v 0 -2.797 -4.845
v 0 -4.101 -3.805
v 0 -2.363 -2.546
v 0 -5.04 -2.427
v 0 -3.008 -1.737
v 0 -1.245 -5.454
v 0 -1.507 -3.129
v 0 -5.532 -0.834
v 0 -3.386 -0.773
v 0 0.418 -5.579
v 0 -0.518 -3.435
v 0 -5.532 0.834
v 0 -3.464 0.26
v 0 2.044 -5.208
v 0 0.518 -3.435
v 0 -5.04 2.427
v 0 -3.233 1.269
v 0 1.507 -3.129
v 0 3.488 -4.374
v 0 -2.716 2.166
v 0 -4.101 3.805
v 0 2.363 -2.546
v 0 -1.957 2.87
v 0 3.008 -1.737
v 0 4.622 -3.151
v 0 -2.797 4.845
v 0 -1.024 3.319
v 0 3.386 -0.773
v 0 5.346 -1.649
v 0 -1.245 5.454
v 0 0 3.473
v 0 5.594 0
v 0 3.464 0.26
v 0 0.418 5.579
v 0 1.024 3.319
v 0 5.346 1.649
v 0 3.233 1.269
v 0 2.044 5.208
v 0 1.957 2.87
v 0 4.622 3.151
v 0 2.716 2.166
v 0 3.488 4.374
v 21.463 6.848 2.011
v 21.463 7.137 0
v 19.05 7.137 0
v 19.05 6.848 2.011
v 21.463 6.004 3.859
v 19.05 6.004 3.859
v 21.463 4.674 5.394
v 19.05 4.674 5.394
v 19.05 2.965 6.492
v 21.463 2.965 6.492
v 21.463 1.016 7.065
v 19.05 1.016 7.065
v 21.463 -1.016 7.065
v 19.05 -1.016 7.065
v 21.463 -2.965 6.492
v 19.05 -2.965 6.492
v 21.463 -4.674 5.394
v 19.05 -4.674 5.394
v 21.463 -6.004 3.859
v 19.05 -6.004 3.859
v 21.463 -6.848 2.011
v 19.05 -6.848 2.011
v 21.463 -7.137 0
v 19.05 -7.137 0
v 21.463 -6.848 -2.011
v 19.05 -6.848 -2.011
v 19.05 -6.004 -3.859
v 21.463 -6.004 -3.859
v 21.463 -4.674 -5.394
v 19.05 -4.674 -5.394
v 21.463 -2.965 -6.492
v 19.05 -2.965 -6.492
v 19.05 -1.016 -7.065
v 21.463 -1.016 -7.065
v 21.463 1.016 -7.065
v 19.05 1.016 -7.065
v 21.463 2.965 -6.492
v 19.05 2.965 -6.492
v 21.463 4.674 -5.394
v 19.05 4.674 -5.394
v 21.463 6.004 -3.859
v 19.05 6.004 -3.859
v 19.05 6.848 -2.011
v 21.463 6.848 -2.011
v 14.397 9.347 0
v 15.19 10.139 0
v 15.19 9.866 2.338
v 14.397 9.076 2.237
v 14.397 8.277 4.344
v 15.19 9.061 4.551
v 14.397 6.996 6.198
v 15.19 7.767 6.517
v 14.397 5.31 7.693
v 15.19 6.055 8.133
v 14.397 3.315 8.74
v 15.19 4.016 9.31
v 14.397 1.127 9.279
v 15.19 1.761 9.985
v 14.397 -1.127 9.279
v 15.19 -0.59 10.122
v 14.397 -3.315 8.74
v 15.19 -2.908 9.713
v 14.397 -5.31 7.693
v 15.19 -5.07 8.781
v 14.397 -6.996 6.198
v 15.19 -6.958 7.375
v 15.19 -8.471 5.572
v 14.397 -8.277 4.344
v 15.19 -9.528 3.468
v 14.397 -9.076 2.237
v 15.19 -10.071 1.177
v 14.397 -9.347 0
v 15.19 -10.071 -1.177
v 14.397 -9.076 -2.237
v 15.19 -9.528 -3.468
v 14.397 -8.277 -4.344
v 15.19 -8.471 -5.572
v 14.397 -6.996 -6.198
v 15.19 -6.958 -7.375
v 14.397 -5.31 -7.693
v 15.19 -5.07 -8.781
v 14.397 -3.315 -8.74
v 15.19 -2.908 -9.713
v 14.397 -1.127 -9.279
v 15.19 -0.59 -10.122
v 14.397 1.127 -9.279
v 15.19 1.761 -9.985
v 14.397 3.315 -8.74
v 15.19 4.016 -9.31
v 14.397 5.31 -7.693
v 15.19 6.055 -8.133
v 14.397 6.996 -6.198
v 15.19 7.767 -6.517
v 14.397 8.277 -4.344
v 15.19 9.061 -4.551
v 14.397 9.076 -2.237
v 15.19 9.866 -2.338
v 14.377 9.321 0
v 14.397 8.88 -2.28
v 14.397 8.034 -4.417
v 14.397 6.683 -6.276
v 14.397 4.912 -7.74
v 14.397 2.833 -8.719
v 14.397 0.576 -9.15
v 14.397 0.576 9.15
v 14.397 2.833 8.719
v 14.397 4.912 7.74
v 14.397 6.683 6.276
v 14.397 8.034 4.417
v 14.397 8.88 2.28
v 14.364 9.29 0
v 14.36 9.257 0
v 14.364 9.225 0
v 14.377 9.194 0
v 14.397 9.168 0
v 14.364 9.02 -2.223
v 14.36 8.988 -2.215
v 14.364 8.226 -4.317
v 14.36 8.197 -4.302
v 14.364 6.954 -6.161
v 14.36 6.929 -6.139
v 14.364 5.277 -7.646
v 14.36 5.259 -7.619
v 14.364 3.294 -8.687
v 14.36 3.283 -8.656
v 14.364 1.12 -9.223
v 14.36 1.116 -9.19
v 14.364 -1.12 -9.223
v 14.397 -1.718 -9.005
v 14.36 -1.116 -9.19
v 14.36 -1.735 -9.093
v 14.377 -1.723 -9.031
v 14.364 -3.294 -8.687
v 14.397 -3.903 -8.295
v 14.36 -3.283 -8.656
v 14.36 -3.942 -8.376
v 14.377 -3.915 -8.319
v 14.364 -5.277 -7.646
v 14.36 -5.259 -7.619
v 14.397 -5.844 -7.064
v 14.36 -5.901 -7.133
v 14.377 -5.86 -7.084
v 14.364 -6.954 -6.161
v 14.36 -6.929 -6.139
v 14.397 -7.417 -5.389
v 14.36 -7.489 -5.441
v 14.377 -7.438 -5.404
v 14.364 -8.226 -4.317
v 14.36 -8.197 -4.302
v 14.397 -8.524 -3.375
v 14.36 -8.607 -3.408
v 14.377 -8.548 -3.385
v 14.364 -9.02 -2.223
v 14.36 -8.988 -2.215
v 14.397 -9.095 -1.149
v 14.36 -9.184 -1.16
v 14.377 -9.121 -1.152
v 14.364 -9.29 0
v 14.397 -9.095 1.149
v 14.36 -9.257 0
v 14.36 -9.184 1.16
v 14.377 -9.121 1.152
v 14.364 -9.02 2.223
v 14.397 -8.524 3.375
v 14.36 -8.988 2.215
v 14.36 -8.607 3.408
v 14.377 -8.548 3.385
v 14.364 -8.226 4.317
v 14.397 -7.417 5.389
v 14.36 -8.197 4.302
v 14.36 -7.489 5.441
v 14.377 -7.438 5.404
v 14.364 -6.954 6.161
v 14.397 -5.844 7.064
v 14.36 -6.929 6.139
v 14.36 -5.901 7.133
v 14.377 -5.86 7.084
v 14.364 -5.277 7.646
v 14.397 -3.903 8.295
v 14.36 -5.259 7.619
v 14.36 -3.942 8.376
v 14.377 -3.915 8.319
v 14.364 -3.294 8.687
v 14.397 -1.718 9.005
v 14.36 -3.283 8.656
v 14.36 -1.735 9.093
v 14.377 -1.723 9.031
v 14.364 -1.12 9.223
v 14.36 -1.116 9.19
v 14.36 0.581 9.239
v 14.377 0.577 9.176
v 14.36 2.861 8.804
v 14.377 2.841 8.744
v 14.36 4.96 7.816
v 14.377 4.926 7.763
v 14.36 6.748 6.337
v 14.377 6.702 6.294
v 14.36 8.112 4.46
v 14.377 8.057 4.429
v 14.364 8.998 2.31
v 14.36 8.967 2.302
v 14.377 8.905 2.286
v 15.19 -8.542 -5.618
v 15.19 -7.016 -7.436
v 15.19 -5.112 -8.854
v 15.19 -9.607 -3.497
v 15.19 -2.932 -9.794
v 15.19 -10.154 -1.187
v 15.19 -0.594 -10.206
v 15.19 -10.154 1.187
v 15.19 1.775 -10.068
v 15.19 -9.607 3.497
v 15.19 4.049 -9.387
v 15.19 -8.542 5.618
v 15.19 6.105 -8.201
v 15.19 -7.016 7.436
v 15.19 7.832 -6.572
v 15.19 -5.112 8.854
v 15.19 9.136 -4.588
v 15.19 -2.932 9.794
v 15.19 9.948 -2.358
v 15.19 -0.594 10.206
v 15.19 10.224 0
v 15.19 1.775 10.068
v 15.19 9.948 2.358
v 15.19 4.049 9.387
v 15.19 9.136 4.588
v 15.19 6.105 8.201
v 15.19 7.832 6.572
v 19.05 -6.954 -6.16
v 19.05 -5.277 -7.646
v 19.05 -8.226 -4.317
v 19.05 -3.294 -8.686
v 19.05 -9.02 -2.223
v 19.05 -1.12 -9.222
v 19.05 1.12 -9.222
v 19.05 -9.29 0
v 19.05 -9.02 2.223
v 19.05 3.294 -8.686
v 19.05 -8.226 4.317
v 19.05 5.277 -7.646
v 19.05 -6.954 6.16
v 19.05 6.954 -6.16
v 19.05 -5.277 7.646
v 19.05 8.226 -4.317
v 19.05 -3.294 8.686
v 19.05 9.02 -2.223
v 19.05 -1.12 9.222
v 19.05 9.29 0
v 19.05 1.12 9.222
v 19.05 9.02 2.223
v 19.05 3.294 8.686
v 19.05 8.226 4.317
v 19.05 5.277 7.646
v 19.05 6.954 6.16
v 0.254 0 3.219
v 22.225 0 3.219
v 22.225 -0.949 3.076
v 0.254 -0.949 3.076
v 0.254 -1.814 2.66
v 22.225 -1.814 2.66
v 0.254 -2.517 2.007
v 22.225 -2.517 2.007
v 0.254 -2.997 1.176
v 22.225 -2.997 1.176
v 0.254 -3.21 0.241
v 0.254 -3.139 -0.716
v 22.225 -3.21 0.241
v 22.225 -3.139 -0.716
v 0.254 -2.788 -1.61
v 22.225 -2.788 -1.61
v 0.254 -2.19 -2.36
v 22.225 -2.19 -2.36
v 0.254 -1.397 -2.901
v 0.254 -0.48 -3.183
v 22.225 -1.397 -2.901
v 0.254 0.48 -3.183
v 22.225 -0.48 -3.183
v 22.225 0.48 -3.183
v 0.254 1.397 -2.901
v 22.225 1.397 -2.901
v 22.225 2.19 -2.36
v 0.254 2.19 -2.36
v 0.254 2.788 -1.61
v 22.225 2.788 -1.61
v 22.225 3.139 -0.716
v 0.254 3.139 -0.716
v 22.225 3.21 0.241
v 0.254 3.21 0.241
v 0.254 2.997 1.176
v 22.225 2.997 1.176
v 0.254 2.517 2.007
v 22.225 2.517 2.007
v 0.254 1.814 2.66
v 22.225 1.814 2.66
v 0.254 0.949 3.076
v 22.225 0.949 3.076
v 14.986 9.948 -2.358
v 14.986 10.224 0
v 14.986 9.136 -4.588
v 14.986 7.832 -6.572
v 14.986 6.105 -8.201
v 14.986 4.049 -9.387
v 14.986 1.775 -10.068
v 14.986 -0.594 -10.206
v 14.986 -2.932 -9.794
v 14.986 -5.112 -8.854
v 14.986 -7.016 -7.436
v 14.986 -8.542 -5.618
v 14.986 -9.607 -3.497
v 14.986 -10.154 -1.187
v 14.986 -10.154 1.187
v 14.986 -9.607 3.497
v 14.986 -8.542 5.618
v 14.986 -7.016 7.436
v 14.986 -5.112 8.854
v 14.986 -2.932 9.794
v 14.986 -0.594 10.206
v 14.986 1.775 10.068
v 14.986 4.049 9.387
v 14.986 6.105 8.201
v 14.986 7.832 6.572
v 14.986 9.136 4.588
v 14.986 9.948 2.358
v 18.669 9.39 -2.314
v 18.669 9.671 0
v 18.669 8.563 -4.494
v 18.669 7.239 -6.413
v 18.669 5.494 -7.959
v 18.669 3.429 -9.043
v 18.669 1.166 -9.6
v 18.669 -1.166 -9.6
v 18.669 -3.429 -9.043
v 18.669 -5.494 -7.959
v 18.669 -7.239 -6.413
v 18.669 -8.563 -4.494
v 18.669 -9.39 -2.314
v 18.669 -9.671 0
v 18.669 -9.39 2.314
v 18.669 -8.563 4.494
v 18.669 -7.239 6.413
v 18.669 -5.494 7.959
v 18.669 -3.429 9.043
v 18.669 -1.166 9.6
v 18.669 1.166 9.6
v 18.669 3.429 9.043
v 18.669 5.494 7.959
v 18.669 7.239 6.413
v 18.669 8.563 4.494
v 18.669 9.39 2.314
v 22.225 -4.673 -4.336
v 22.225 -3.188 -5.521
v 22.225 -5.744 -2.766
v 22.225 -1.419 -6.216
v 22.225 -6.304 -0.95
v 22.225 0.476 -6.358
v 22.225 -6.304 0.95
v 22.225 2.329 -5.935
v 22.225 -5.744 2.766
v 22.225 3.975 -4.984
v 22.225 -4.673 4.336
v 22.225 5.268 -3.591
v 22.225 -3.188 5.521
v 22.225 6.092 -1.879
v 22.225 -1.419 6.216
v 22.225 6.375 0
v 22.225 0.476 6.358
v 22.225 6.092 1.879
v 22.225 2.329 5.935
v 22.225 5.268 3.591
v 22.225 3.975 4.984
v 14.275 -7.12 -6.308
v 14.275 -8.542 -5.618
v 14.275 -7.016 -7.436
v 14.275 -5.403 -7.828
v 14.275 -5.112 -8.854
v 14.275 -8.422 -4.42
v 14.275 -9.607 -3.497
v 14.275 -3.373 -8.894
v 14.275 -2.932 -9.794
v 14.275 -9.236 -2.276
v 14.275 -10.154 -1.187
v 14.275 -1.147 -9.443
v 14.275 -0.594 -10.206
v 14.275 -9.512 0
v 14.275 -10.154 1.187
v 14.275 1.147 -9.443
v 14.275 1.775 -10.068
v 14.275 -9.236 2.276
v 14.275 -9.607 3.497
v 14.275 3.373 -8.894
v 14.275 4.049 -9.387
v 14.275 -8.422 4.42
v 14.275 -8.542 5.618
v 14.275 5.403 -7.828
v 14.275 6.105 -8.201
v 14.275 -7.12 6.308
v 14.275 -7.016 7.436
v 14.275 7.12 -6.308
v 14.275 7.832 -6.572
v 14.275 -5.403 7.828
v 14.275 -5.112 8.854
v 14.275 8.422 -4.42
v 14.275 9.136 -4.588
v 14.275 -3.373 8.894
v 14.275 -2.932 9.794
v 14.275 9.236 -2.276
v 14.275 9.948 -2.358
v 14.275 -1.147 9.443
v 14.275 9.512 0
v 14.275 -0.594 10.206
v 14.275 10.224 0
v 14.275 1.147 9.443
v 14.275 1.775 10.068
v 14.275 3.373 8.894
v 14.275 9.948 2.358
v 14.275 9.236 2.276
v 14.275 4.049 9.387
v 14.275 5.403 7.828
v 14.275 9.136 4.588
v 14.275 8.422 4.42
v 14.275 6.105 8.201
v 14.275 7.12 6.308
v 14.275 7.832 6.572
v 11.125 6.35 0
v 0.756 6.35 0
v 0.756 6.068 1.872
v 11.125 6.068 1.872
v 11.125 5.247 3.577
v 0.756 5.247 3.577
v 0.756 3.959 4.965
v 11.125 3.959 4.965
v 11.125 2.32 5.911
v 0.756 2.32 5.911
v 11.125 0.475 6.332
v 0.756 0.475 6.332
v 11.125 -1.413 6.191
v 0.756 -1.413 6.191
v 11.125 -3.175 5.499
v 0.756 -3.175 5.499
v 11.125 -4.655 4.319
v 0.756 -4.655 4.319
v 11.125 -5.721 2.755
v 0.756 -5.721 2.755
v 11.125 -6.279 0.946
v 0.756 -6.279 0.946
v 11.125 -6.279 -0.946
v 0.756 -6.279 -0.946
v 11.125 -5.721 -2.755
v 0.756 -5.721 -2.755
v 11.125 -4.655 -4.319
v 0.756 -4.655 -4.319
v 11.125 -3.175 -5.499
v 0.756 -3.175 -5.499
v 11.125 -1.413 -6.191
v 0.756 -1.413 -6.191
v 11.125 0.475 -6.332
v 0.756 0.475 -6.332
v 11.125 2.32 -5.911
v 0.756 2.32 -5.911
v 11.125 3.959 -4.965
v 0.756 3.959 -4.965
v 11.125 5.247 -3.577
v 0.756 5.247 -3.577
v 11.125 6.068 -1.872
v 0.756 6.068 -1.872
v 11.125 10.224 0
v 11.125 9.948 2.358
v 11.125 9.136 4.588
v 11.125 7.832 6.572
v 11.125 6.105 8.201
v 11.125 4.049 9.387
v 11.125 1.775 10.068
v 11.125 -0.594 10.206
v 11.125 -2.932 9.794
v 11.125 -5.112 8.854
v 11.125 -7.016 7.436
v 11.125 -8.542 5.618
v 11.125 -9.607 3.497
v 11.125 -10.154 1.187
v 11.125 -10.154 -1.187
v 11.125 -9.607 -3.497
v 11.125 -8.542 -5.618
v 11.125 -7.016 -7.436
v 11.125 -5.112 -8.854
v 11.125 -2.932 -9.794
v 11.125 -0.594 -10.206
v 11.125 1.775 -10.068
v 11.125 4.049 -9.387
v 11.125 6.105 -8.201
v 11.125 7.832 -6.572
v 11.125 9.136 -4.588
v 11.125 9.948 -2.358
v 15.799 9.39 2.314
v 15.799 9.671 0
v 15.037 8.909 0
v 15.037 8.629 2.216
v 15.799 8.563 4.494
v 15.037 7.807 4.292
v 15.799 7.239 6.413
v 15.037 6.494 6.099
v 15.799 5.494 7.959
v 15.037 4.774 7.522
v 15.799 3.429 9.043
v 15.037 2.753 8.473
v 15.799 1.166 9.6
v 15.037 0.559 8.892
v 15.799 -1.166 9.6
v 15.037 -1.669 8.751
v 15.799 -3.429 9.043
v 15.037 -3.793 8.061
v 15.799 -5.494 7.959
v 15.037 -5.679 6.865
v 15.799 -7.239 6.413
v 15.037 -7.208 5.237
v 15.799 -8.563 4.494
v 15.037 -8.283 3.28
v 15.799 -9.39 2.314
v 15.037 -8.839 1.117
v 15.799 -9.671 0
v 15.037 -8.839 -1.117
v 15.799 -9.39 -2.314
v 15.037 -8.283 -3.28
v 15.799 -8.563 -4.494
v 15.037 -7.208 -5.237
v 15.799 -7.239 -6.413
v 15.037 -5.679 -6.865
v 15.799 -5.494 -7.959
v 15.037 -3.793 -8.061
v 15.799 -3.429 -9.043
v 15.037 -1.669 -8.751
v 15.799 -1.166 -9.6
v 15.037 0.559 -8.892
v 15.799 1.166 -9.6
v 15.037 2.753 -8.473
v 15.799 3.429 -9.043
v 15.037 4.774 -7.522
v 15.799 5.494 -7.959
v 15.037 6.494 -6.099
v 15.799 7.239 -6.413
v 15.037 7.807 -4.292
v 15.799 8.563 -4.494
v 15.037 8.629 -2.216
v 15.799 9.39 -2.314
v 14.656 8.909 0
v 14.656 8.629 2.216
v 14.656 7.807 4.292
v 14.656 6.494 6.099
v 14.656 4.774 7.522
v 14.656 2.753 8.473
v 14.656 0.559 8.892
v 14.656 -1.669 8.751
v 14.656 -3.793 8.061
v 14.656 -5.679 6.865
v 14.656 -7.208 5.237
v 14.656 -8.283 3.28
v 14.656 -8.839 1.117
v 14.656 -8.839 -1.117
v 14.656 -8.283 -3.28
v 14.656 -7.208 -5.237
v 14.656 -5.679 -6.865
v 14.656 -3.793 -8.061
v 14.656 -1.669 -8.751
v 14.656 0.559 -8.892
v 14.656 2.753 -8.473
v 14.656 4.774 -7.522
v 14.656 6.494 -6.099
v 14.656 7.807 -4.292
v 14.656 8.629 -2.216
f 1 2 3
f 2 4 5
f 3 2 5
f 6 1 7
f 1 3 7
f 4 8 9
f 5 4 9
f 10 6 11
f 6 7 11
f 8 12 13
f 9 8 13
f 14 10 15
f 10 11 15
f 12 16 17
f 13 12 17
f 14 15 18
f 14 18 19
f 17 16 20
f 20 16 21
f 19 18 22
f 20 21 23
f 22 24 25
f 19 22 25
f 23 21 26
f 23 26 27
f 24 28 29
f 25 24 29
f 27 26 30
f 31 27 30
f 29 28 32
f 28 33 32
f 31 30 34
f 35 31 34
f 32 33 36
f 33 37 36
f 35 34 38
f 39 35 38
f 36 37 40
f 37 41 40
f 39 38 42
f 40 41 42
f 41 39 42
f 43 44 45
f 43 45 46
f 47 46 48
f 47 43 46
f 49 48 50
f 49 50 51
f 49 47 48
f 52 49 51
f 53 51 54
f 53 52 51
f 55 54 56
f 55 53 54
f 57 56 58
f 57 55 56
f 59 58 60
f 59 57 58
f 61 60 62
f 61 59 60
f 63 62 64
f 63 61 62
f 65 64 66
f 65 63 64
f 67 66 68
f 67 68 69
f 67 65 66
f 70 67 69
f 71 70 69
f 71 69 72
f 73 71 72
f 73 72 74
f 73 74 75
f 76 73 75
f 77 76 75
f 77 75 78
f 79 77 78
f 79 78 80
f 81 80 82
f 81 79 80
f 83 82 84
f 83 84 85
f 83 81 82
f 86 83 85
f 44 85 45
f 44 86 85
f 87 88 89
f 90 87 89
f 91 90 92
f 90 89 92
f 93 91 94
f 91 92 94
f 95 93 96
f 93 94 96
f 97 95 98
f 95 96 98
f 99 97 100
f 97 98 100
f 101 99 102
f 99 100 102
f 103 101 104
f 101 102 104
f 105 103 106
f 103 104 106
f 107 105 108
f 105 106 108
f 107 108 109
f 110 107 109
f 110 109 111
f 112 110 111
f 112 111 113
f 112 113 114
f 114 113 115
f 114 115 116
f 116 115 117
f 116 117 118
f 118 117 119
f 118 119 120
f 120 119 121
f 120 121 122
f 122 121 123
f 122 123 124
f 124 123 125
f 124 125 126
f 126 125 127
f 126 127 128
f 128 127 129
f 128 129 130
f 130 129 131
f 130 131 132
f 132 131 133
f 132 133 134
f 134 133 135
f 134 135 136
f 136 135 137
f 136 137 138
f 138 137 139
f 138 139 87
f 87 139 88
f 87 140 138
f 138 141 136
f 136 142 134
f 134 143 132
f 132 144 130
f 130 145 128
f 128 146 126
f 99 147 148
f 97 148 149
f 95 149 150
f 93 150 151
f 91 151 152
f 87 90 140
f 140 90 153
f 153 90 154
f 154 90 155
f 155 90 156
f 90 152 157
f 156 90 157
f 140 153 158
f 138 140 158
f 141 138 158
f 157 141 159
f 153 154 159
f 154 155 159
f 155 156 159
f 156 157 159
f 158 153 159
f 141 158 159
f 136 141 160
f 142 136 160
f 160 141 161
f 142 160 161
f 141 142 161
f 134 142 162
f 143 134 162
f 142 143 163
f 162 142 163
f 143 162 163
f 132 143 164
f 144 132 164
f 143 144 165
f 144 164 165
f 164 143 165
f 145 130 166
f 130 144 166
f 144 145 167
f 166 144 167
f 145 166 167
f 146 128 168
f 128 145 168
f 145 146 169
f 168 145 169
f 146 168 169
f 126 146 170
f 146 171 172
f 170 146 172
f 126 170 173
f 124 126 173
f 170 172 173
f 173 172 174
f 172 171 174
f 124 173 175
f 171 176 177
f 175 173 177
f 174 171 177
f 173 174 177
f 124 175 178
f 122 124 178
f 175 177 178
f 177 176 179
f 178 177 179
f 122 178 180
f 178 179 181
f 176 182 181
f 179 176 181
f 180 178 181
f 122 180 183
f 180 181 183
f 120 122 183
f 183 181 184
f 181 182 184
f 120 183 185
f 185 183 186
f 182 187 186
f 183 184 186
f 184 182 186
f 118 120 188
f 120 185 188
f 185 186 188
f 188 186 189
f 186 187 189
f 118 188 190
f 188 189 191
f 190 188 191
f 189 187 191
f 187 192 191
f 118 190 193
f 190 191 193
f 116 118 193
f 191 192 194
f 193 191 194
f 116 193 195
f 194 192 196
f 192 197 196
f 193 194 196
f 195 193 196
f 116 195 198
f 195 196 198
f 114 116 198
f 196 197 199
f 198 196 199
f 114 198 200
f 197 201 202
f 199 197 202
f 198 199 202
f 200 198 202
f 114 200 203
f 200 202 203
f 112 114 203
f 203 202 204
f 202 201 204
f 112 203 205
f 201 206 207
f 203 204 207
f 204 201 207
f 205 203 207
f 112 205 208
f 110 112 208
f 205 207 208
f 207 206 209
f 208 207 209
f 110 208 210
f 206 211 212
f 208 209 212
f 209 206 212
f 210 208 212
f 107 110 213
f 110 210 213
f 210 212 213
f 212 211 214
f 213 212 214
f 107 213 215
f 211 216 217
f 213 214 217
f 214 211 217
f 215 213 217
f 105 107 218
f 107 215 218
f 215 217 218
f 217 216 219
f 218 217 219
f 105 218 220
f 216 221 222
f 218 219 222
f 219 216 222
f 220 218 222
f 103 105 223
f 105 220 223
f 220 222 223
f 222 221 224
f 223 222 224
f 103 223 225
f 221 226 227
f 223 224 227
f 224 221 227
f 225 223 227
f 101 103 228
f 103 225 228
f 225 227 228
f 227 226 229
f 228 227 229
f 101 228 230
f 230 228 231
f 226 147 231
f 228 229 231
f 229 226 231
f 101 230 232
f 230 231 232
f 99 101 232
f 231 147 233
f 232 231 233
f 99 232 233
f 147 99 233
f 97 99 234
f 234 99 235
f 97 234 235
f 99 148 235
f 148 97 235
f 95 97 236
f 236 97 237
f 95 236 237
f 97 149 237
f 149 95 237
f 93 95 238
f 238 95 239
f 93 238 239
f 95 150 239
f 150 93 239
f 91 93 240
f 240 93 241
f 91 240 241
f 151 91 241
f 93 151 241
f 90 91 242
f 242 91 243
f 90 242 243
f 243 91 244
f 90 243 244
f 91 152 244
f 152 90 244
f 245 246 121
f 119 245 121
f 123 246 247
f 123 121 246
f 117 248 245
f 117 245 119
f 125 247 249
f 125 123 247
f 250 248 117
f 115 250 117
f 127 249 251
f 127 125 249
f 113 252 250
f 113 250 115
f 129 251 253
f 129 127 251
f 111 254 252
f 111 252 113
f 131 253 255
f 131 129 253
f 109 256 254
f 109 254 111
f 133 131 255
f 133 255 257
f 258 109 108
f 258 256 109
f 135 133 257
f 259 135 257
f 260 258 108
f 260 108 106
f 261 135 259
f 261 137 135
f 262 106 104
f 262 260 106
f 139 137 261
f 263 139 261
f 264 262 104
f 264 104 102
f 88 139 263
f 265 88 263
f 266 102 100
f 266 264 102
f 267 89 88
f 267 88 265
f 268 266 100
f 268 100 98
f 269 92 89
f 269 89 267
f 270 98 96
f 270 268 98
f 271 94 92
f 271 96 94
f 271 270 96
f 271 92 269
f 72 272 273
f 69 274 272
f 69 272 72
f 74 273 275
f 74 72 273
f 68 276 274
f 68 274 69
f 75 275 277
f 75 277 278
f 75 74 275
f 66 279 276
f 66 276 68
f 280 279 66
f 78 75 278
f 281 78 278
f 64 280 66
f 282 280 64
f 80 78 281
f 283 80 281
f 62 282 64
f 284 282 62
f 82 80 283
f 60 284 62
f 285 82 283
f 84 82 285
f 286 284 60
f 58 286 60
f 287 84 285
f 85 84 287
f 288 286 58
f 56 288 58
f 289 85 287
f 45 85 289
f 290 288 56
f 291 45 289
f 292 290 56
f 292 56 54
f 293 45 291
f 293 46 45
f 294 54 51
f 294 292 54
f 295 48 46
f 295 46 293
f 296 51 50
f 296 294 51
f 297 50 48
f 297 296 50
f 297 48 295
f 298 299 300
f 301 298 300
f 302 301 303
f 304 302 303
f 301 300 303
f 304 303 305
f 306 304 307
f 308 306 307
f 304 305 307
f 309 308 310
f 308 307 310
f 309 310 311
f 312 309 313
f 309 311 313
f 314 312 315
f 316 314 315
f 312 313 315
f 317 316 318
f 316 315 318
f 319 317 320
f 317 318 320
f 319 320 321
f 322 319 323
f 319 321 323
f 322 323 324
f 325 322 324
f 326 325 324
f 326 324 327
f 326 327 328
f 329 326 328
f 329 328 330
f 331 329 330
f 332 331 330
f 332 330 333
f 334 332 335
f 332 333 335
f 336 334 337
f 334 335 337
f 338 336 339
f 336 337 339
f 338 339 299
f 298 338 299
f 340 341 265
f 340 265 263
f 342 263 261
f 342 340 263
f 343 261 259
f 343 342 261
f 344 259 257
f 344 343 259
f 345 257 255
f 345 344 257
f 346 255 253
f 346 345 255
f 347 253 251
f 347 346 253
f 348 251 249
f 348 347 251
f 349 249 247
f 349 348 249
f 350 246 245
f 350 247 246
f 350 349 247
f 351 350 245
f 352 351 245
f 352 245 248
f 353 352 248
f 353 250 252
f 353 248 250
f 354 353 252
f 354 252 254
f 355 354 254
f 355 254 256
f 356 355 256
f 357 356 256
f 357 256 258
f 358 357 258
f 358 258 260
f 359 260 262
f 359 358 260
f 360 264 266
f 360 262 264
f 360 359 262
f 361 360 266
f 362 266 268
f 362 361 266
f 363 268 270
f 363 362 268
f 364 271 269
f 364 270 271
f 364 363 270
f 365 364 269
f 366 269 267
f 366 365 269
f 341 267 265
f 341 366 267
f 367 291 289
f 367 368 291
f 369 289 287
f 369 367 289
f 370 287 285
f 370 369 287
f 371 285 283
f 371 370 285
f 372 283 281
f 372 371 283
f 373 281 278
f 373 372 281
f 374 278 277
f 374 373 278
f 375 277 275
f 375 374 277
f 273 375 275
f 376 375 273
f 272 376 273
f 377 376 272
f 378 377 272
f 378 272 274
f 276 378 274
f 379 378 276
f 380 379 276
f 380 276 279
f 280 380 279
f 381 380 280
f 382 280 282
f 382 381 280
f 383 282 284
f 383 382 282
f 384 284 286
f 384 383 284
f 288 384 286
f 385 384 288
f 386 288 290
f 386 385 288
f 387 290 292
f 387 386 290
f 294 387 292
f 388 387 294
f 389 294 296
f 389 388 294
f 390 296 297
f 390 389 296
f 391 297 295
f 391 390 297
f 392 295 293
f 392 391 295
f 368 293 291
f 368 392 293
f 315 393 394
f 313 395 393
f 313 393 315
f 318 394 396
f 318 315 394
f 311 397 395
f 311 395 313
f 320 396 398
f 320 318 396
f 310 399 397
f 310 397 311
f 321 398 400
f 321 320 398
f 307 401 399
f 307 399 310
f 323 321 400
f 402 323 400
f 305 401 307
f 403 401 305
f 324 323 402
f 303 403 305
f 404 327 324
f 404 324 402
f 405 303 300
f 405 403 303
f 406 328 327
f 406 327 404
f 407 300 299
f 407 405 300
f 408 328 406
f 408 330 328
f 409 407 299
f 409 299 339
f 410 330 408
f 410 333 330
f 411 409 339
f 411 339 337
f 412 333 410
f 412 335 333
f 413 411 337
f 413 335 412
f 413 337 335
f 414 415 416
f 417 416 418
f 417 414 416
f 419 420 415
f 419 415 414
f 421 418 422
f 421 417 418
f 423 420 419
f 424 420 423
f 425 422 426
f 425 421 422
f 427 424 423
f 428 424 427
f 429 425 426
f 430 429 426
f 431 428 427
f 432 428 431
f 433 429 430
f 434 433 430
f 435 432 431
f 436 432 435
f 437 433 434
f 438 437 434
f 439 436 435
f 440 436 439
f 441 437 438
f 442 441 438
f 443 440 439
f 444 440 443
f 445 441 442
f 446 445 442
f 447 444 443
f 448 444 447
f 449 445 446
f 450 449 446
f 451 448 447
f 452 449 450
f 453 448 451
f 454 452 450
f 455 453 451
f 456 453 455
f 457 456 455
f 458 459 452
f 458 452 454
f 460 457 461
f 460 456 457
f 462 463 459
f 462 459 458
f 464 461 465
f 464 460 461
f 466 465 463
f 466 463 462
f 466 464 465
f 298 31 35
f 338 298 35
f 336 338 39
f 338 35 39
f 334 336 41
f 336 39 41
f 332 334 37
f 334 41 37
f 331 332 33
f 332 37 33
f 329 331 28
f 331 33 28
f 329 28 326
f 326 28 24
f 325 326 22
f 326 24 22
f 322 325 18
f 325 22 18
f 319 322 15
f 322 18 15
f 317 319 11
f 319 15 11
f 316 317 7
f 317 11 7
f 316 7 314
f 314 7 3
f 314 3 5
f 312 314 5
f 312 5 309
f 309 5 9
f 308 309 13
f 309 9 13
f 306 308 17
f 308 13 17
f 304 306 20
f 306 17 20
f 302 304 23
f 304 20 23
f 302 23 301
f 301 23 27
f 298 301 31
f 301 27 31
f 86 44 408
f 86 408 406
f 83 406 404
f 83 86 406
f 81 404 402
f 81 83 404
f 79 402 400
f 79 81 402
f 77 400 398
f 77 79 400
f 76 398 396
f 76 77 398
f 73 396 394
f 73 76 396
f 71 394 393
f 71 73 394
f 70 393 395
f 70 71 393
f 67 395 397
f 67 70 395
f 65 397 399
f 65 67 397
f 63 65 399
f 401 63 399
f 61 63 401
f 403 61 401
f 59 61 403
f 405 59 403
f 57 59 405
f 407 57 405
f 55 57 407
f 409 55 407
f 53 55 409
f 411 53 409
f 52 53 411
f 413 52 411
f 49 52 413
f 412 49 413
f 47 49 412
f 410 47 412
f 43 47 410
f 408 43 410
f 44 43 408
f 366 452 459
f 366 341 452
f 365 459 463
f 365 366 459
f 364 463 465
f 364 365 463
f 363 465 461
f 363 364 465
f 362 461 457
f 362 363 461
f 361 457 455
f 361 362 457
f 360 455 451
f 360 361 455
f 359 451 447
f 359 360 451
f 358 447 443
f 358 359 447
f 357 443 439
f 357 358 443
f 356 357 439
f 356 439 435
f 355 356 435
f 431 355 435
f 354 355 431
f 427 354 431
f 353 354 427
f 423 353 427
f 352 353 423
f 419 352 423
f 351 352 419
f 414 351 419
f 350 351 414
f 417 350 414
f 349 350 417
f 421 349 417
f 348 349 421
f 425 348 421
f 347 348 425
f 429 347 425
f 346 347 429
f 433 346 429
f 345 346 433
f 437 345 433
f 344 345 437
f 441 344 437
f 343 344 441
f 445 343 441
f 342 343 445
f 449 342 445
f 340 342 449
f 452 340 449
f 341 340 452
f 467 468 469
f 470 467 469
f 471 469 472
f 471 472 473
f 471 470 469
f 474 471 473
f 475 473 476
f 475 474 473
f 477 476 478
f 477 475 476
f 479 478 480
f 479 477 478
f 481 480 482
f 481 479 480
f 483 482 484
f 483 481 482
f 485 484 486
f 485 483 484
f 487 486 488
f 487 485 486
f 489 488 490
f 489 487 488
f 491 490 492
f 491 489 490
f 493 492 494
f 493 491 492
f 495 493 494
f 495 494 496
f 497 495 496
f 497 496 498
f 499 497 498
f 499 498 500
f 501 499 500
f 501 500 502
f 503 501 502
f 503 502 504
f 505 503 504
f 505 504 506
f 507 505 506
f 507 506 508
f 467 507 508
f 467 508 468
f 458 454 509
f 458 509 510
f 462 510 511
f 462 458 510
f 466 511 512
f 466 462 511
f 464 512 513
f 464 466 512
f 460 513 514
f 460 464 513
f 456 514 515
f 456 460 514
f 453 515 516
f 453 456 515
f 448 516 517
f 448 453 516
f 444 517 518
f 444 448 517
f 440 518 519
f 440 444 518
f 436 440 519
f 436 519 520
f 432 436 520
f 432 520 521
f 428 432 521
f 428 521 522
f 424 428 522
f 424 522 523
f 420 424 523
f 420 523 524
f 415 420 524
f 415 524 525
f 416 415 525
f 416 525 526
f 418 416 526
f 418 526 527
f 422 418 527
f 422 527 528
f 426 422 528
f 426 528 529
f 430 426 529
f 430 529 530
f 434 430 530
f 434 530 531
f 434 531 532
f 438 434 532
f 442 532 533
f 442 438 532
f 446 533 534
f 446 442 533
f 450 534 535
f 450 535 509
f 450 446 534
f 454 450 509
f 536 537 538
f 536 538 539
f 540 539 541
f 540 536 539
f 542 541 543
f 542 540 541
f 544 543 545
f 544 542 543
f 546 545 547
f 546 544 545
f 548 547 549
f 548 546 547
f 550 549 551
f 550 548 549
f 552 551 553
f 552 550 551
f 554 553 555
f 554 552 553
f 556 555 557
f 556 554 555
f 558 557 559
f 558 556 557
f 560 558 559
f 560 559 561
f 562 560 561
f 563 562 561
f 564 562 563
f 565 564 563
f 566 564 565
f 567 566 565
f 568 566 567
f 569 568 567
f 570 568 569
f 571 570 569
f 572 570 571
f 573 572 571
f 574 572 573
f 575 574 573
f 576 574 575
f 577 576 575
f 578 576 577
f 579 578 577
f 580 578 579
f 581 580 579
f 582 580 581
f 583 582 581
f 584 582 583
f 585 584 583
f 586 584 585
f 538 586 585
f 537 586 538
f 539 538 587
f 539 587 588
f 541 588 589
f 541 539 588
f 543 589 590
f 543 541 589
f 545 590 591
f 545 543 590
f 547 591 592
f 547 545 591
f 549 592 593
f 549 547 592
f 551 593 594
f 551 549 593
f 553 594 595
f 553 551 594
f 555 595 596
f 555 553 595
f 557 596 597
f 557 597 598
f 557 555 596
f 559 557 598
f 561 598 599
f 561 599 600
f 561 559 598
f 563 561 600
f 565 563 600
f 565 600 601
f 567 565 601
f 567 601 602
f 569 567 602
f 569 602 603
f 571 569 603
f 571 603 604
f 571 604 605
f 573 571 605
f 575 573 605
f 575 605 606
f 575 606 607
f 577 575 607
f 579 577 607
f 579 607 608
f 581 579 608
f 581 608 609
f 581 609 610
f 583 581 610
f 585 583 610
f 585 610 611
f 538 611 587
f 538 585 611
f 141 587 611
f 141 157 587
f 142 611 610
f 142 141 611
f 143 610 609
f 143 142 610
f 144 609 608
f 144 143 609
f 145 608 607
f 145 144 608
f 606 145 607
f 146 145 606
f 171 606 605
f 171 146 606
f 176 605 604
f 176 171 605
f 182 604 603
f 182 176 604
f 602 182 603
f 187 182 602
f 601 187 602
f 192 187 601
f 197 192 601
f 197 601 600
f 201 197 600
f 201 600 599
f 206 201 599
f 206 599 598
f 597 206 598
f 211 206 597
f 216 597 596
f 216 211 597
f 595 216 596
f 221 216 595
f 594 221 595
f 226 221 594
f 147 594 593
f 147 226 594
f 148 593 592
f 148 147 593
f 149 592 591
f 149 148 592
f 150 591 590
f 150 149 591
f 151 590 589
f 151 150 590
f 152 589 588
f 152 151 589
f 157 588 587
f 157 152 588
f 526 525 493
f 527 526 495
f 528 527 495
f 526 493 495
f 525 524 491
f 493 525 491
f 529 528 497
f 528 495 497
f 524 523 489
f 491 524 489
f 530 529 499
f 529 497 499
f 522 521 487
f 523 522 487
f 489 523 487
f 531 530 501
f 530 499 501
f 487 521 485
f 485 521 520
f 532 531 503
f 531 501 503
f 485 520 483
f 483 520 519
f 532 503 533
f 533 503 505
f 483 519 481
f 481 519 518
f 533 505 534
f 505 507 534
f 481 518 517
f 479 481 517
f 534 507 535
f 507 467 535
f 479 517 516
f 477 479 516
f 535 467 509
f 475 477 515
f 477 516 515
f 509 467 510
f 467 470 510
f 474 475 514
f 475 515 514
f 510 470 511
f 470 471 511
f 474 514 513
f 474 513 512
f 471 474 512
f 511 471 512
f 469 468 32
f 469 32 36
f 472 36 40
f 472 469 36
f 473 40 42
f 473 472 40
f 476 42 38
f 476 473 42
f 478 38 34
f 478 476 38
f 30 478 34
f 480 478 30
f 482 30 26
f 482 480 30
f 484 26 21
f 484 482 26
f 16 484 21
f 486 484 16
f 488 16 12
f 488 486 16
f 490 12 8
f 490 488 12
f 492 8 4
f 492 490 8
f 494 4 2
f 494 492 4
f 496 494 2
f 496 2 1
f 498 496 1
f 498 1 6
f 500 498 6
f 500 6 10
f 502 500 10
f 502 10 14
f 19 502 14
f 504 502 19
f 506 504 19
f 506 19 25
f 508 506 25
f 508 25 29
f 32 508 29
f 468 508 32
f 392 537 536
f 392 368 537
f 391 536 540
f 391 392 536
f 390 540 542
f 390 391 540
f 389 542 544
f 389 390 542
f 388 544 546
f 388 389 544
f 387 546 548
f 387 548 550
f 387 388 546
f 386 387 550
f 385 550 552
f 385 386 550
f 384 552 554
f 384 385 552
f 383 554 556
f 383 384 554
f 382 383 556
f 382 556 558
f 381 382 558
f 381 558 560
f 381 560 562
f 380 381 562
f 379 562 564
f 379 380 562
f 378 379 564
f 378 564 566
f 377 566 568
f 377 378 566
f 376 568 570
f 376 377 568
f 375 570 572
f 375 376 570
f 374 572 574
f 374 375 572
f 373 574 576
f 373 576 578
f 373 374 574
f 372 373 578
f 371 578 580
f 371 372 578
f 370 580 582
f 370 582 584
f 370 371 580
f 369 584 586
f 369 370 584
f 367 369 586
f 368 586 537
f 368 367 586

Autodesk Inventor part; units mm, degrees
sketch "Sketch_1" plane through (0, 0, 0) normal (0, 0, 1) x (1, 0, 0)
  line L0 (11.1252, 0) -> (0, 0)
  line L1 (0, 0) -> (0, 5.5944)
  line L2 (0, 5.5944) -> (0.7557, 6.35)
  line L3 (0.7557, 6.35) -> (11.1252, 6.35)
  line L4 (11.1252, 6.35) -> (11.1252, 0)
  line L5 (11.1252, 0) -> (0, 0)
revolve "Revolution1" add sketch "Sketch_1" angle 360 about axis through (11.1252, 0, 0) along (1, 0, 0)
thread "Thread1" size "1/2-20 UNF" class "2A" standard "ANSI Unified Screw Threads" full length
sketch "Sketch_3" plane through (0, 0, 0) normal (0, 0, 1) x (1, 0, 0)
  line L0 (19.05, 0) -> (11.1252, 0)
  line L1 (11.1252, 0) -> (11.1252, 10.2235)
  line L2 (11.1252, 10.2235) -> (14.2748, 10.2235)
  line L3 (14.2748, 10.2235) -> (14.2748, 8.9091)
  line L4 (14.2748, 8.9091) -> (15.0368, 8.9091)
  line L5 (15.0368, 8.9091) -> (15.7988, 9.671)
  line L6 (15.7988, 9.671) -> (18.669, 9.671)
  line L7 (18.669, 9.671) -> (19.05, 9.2901)
  line L8 (19.05, 9.2901) -> (19.05, 0)
  line L9 (19.05, 0) -> (11.1252, 0)
revolve "Revolution2" add sketch "Sketch_3" angle 360 about axis through (19.05, 0, 0) along (1, 0, 0)
sketch "Sketch_4" plane through (0, 0, 0) normal (0, 0, 1) x (1, 0, 0)
  line L0 (22.225, 0) -> (19.05, 0)
  line L1 (19.05, 0) -> (19.05, 7.1374)
  line L2 (19.05, 7.1374) -> (21.463, 7.1374)
  line L3 (21.463, 7.1374) -> (22.225, 6.3754)
  line L4 (22.225, 6.3754) -> (22.225, 0)
  line L5 (22.225, 0) -> (19.05, 0)
revolve "Revolution3" add sketch "Sketch_4" angle 360 about axis through (22.225, 0, 0) along (1, 0, 0)
sketch "Sketch4" plane through (0, 0, 0) normal (-1, 0, 0) x (0, 0, 1)
  point P0 (0, 0)
hole "Hole1" at (0, 0, 0) direction (1, 0, 0) diameter 6.4389 depth 22.225 countersink diameter 6.9469 countersink angle 90
sketch "Sketch_47" plane through (0, 0, 0) normal (0, 0, 1) x (1, 0, 0)
  line L0 (15.0368, 0) -> (14.2748, 0)
  line L1 (14.2748, 9.512) -> (14.2748, 8.655)
  line L2 (14.2748, 8.655) -> (15.0368, 8.655)
  line L3 (15.0368, 8.655) -> (15.0368, 8.9091)
  line L4 (15.0368, 8.9091) -> (14.6558, 8.9091)
  line L5 (14.6558, 8.9091) -> (14.3973, 9.1676)
  arc A0 (14.3973, 9.3472) -> (14.3973, 9.1676) centre (14.4871, 9.2574) ccw
  line L6 (14.3973, 9.3472) -> (15.1895, 10.1393)
  line L7 (15.1895, 10.1393) -> (15.1895, 10.2235)
  line L8 (15.1895, 10.2235) -> (14.9863, 10.2235)
  line L9 (14.9863, 10.2235) -> (14.2748, 9.512)
revolve "Revolution4" add sketch "Sketch_47" angle 360 about axis through (15.0368, 0, 0) along (1, 0, 0)
ref_plane "hh_XY" through (0, 6.35, 0) normal (0, 0, 1) x (1, 0, 0)
ref_plane "hh_YZ" through (0, 6.35, 0) normal (1, 0, 0) x (0, 1, 0)
ref_plane "hh_ZX" through (0, 6.35, 0) normal (0, 1, 0) x (0, 0, 1)
ref_plane "rod_guide_XY" through (0, 0, 0) normal (1, 0, 0) x (0, 0, -1)
ref_plane "rod_guide_YZ" through (0, 0, 0) normal (0, 0, -1) x (0, 1, 0)
ref_plane "rod_guide_ZX" through (0, 0, 0) normal (0, 1, 0) x (1, 0, 0)
ref_plane "t1_XY" through (11.1252, 0, 0) normal (1, 0, 0) x (0, 0, -1)
ref_plane "t1_YZ" through (11.1252, 0, 0) normal (0, 0, -1) x (0, 1, 0)
ref_plane "t1_ZX" through (11.1252, 0, 0) normal (0, 1, 0) x (1, 0, 0)
ref_plane "t111_XY" through (11.1252, 0, 0) normal (1, 0, 0) x (0, 0, -1)
ref_plane "t111_YZ" through (11.1252, 0, 0) normal (0, 0, -1) x (0, 1, 0)
ref_plane "t111_ZX" through (11.1252, 0, 0) normal (0, 1, 0) x (1, 0, 0)
ref_plane "to_foot_bracket_XY" through (11.1252, 0, 0) normal (1, 0, 0) x (0, 0, -1)
ref_plane "to_foot_bracket_YZ" through (11.1252, 0, 0) normal (0, 0, -1) x (0, 1, 0)
ref_plane "to_foot_bracket_ZX" through (11.1252, 0, 0) normal (0, 1, 0) x (1, 0, 0)
ref_plane "to_nut_XY" through (11.1252, 0, 0) normal (1, 0, 0) x (0, 0, -1)
ref_plane "to_nut_YZ" through (11.1252, 0, 0) normal (0, 0, -1) x (0, 1, 0)
ref_plane "to_nut_ZX" through (11.1252, 0, 0) normal (0, 1, 0) x (1, 0, 0)
ref_plane "to_rod_XY" through (0, 0, 0) normal (1, 0, 0) x (0, 0, -1)
ref_plane "to_rod_YZ" through (0, 0, 0) normal (0, 0, -1) x (0, 1, 0)
ref_plane "to_rod_ZX" through (0, 0, 0) normal (0, 1, 0) x (1, 0, 0)
ref_plane "to_screw_XY" through (6.35, 2.032, -6.0452) normal (0, 1, 0) x (1, 0, 0)
ref_plane "to_screw_YZ" through (6.35, 2.032, -6.0452) normal (1, 0, 0) x (0, 0, -1)
ref_plane "to_screw_ZX" through (6.35, 2.032, -6.0452) normal (0, 0, -1) x (0, 1, 0)
ref_plane "to_trunnion_brackets_XY" through (11.1252, 0, 0) normal (0, 1, 0) x (1, 0, 0)
ref_plane "to_trunnion_brackets_YZ" through (11.1252, 0, 0) normal (1, 0, 0) x (0, 0, -1)
ref_plane "to_trunnion_brackets_ZX" through (11.1252, 0, 0) normal (0, 0, -1) x (0, 1, 0)
ref_plane "to_trunnion_brackets1_XY" through (11.1252, 12.7, 0) normal (0, 1, 0) x (1, 0, 0)
ref_plane "to_trunnion_brackets1_YZ" through (11.1252, 12.7, 0) normal (1, 0, 0) x (0, 0, -1)
ref_plane "to_trunnion_brackets1_ZX" through (11.1252, 12.7, 0) normal (0, 0, -1) x (0, 1, 0)
ref_plane "to_trunnion_brackets2_XY" through (11.1252, -12.7, 0) normal (0, 1, 0) x (1, 0, 0)
ref_plane "to_trunnion_brackets2_YZ" through (11.1252, -12.7, 0) normal (1, 0, 0) x (0, 0, -1)
ref_plane "to_trunnion_brackets2_ZX" through (11.1252, -12.7, 0) normal (0, 0, -1) x (0, 1, 0)
ref_plane "to_tube_XY" through (15.0368, 0, 0) normal (1, 0, 0) x (0, 0, -1)
ref_plane "to_tube_YZ" through (15.0368, 0, 0) normal (0, 0, -1) x (0, 1, 0)
ref_plane "to_tube_ZX" through (15.0368, 0, 0) normal (0, 1, 0) x (1, 0, 0)
properties part number "04000-0_rod_guide"
